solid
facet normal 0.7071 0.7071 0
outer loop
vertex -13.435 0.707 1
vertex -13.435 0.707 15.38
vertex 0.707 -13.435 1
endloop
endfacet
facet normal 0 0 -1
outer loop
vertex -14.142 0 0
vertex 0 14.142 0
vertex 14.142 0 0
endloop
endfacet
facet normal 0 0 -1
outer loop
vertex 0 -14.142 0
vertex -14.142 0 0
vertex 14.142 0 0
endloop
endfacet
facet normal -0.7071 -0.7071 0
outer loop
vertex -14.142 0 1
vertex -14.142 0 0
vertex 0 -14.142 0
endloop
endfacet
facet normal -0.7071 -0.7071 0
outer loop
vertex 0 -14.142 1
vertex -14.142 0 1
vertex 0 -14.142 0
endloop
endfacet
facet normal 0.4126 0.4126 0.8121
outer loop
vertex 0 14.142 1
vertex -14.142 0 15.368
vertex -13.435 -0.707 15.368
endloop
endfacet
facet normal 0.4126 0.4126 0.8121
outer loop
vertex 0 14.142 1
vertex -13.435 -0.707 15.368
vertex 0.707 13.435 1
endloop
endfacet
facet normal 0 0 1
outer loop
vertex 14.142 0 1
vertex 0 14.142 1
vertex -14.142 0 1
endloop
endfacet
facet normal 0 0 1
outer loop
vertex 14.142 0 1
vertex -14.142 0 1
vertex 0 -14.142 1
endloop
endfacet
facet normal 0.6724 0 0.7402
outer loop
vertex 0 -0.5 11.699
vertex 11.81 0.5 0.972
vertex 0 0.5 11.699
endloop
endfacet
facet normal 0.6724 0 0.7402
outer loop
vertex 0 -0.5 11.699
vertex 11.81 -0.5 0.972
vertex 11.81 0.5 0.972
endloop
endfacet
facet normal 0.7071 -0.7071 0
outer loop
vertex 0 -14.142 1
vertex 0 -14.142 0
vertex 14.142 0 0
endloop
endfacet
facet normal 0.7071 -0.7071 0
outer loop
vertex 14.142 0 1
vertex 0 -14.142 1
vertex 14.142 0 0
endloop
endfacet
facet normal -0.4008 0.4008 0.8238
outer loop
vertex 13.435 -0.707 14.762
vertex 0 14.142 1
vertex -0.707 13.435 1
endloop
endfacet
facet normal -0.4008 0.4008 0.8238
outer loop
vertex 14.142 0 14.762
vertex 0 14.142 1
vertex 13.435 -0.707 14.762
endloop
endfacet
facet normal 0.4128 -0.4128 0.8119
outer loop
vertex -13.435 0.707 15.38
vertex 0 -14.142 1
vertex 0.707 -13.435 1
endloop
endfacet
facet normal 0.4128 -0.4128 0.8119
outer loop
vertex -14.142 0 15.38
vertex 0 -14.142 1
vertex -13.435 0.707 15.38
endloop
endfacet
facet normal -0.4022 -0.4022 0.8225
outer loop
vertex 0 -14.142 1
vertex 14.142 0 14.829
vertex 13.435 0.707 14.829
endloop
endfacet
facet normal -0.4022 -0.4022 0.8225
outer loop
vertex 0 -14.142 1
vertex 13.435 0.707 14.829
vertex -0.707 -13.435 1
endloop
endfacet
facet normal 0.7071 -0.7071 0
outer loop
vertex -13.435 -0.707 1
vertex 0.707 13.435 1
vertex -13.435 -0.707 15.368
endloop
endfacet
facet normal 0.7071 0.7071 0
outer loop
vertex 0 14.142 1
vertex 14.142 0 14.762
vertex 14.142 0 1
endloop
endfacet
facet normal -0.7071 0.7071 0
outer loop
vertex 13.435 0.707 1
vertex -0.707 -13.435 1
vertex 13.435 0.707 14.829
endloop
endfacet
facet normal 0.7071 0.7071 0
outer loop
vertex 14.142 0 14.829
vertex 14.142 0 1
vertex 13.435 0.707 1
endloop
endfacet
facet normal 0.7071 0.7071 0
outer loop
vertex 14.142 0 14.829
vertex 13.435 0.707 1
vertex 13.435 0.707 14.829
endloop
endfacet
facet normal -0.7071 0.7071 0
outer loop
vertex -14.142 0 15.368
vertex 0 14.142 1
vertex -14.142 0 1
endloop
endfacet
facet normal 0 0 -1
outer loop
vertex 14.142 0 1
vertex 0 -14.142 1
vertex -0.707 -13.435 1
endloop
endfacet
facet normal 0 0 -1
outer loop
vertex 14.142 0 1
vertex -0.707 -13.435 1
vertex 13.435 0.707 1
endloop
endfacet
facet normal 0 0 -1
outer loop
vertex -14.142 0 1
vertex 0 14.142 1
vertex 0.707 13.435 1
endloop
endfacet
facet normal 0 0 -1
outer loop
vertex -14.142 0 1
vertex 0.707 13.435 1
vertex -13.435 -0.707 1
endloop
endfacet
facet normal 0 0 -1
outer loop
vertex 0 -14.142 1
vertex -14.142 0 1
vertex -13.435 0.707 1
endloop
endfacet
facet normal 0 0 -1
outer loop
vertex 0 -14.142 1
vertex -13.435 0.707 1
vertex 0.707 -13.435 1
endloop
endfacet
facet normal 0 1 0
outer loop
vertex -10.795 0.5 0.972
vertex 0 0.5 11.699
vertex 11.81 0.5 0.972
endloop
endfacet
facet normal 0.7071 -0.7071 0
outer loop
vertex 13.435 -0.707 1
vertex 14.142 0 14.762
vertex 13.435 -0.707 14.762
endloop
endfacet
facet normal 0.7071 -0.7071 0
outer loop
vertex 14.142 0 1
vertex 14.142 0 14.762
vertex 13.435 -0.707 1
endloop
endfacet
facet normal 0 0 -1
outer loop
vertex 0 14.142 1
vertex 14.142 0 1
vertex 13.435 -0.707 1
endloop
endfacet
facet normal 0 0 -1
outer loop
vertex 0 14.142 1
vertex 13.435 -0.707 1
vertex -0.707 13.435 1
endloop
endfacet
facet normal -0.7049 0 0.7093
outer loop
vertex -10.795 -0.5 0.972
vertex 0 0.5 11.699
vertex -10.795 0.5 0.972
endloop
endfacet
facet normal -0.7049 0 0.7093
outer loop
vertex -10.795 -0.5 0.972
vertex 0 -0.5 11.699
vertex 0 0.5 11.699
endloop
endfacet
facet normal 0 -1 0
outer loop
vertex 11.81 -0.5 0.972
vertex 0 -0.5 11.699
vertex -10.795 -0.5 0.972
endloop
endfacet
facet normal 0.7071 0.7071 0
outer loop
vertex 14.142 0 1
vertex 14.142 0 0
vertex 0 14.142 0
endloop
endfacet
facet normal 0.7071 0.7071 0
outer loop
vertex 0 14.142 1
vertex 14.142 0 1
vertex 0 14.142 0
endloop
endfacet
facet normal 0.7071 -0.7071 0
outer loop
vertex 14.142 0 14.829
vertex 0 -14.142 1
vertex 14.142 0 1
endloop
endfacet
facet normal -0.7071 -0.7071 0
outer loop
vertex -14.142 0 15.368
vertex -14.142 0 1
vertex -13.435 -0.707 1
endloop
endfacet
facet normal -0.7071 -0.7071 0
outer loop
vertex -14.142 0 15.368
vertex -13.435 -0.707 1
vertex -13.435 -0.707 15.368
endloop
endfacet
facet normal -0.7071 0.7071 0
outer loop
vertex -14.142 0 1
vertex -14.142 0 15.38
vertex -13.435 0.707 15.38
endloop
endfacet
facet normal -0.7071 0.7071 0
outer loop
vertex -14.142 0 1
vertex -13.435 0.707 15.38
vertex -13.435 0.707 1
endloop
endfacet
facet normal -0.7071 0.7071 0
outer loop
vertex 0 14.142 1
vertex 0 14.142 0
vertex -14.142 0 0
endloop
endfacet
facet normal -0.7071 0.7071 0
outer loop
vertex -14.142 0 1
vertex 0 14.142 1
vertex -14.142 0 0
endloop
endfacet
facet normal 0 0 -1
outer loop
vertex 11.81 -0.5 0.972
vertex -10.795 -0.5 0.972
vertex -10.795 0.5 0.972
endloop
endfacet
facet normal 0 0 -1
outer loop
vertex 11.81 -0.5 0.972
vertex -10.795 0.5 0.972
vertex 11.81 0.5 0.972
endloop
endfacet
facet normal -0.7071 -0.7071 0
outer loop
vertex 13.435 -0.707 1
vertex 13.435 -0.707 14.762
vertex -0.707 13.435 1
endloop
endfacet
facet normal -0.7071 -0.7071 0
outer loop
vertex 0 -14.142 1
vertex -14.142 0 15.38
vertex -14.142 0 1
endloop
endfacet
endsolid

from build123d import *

# Parameters (mm, degrees)
F1_DEPTH  = 1
F3_DEPTH  = 0.5
F5_DEPTH  = 1
F7_DEPTH  = 1
F9_DEPTH  = 1
F11_DEPTH = 1


with BuildPart() as f1:
    # F0 (on Top) → F1 (new body)
    with BuildSketch(Plane.XY):
        Polygon((0, 14.142136), (-14.142136, 0), (0, -14.142136), (14.142136, 0), align=None)
    extrude(amount=F1_DEPTH)


with BuildPart() as f3:
    # F2 (on Front) → F3 (new body, symmetric)
    with BuildSketch(Plane.XZ):
        Polygon((0, 11.699272), (-10.795075, 0.971594), (11.810176, 0.971594), align=None)
    extrude(amount=F3_DEPTH, both=True)


with BuildPart() as f5:
    # F4 (on face) → F5 (new body)
    with BuildSketch(Plane(origin=(-7.071068, 7.071068, 0), x_dir=(-0.707107, -0.707107, 0), z_dir=(-0.707107, 0.707107, 0))):
        Polygon((10, 15.368261), (-10, 1), (10, 1), align=None)
    extrude(amount=-F5_DEPTH)


with BuildPart() as f7:
    # F6 (on face) → F7 (new body)
    with BuildSketch(Plane(origin=(-7.071068, -7.071068, 0), x_dir=(0.707107, -0.707107, 0), z_dir=(-0.707107, -0.707107, 0))):
        Polygon((-10, 15.379625), (-10, 1), (10, 1), align=None)
    extrude(amount=-F7_DEPTH)


with BuildPart() as f9:
    # F8 (on face) → F9 (new body)
    with BuildSketch(Plane(origin=(7.071068, -7.071068, 0), x_dir=(0.707107, 0.707107, 0), z_dir=(0.707107, -0.707107, 0))):
        Polygon((10, 14.8289), (-10, 1), (10, 1), align=None)
    extrude(amount=-F9_DEPTH)


with BuildPart() as f11:
    # F10 (on face) → F11 (new body)
    with BuildSketch(Plane(origin=(7.071068, 7.071068, 0), x_dir=(-0.707107, 0.707107, 0), z_dir=(0.707107, 0.707107, 0))):
        Polygon((-10, 1), (10, 1), (-10, 14.761985), align=None)
    extrude(amount=-F11_DEPTH)


solid = Compound([f1.part, f3.part, f5.part, f7.part, f9.part, f11.part])
